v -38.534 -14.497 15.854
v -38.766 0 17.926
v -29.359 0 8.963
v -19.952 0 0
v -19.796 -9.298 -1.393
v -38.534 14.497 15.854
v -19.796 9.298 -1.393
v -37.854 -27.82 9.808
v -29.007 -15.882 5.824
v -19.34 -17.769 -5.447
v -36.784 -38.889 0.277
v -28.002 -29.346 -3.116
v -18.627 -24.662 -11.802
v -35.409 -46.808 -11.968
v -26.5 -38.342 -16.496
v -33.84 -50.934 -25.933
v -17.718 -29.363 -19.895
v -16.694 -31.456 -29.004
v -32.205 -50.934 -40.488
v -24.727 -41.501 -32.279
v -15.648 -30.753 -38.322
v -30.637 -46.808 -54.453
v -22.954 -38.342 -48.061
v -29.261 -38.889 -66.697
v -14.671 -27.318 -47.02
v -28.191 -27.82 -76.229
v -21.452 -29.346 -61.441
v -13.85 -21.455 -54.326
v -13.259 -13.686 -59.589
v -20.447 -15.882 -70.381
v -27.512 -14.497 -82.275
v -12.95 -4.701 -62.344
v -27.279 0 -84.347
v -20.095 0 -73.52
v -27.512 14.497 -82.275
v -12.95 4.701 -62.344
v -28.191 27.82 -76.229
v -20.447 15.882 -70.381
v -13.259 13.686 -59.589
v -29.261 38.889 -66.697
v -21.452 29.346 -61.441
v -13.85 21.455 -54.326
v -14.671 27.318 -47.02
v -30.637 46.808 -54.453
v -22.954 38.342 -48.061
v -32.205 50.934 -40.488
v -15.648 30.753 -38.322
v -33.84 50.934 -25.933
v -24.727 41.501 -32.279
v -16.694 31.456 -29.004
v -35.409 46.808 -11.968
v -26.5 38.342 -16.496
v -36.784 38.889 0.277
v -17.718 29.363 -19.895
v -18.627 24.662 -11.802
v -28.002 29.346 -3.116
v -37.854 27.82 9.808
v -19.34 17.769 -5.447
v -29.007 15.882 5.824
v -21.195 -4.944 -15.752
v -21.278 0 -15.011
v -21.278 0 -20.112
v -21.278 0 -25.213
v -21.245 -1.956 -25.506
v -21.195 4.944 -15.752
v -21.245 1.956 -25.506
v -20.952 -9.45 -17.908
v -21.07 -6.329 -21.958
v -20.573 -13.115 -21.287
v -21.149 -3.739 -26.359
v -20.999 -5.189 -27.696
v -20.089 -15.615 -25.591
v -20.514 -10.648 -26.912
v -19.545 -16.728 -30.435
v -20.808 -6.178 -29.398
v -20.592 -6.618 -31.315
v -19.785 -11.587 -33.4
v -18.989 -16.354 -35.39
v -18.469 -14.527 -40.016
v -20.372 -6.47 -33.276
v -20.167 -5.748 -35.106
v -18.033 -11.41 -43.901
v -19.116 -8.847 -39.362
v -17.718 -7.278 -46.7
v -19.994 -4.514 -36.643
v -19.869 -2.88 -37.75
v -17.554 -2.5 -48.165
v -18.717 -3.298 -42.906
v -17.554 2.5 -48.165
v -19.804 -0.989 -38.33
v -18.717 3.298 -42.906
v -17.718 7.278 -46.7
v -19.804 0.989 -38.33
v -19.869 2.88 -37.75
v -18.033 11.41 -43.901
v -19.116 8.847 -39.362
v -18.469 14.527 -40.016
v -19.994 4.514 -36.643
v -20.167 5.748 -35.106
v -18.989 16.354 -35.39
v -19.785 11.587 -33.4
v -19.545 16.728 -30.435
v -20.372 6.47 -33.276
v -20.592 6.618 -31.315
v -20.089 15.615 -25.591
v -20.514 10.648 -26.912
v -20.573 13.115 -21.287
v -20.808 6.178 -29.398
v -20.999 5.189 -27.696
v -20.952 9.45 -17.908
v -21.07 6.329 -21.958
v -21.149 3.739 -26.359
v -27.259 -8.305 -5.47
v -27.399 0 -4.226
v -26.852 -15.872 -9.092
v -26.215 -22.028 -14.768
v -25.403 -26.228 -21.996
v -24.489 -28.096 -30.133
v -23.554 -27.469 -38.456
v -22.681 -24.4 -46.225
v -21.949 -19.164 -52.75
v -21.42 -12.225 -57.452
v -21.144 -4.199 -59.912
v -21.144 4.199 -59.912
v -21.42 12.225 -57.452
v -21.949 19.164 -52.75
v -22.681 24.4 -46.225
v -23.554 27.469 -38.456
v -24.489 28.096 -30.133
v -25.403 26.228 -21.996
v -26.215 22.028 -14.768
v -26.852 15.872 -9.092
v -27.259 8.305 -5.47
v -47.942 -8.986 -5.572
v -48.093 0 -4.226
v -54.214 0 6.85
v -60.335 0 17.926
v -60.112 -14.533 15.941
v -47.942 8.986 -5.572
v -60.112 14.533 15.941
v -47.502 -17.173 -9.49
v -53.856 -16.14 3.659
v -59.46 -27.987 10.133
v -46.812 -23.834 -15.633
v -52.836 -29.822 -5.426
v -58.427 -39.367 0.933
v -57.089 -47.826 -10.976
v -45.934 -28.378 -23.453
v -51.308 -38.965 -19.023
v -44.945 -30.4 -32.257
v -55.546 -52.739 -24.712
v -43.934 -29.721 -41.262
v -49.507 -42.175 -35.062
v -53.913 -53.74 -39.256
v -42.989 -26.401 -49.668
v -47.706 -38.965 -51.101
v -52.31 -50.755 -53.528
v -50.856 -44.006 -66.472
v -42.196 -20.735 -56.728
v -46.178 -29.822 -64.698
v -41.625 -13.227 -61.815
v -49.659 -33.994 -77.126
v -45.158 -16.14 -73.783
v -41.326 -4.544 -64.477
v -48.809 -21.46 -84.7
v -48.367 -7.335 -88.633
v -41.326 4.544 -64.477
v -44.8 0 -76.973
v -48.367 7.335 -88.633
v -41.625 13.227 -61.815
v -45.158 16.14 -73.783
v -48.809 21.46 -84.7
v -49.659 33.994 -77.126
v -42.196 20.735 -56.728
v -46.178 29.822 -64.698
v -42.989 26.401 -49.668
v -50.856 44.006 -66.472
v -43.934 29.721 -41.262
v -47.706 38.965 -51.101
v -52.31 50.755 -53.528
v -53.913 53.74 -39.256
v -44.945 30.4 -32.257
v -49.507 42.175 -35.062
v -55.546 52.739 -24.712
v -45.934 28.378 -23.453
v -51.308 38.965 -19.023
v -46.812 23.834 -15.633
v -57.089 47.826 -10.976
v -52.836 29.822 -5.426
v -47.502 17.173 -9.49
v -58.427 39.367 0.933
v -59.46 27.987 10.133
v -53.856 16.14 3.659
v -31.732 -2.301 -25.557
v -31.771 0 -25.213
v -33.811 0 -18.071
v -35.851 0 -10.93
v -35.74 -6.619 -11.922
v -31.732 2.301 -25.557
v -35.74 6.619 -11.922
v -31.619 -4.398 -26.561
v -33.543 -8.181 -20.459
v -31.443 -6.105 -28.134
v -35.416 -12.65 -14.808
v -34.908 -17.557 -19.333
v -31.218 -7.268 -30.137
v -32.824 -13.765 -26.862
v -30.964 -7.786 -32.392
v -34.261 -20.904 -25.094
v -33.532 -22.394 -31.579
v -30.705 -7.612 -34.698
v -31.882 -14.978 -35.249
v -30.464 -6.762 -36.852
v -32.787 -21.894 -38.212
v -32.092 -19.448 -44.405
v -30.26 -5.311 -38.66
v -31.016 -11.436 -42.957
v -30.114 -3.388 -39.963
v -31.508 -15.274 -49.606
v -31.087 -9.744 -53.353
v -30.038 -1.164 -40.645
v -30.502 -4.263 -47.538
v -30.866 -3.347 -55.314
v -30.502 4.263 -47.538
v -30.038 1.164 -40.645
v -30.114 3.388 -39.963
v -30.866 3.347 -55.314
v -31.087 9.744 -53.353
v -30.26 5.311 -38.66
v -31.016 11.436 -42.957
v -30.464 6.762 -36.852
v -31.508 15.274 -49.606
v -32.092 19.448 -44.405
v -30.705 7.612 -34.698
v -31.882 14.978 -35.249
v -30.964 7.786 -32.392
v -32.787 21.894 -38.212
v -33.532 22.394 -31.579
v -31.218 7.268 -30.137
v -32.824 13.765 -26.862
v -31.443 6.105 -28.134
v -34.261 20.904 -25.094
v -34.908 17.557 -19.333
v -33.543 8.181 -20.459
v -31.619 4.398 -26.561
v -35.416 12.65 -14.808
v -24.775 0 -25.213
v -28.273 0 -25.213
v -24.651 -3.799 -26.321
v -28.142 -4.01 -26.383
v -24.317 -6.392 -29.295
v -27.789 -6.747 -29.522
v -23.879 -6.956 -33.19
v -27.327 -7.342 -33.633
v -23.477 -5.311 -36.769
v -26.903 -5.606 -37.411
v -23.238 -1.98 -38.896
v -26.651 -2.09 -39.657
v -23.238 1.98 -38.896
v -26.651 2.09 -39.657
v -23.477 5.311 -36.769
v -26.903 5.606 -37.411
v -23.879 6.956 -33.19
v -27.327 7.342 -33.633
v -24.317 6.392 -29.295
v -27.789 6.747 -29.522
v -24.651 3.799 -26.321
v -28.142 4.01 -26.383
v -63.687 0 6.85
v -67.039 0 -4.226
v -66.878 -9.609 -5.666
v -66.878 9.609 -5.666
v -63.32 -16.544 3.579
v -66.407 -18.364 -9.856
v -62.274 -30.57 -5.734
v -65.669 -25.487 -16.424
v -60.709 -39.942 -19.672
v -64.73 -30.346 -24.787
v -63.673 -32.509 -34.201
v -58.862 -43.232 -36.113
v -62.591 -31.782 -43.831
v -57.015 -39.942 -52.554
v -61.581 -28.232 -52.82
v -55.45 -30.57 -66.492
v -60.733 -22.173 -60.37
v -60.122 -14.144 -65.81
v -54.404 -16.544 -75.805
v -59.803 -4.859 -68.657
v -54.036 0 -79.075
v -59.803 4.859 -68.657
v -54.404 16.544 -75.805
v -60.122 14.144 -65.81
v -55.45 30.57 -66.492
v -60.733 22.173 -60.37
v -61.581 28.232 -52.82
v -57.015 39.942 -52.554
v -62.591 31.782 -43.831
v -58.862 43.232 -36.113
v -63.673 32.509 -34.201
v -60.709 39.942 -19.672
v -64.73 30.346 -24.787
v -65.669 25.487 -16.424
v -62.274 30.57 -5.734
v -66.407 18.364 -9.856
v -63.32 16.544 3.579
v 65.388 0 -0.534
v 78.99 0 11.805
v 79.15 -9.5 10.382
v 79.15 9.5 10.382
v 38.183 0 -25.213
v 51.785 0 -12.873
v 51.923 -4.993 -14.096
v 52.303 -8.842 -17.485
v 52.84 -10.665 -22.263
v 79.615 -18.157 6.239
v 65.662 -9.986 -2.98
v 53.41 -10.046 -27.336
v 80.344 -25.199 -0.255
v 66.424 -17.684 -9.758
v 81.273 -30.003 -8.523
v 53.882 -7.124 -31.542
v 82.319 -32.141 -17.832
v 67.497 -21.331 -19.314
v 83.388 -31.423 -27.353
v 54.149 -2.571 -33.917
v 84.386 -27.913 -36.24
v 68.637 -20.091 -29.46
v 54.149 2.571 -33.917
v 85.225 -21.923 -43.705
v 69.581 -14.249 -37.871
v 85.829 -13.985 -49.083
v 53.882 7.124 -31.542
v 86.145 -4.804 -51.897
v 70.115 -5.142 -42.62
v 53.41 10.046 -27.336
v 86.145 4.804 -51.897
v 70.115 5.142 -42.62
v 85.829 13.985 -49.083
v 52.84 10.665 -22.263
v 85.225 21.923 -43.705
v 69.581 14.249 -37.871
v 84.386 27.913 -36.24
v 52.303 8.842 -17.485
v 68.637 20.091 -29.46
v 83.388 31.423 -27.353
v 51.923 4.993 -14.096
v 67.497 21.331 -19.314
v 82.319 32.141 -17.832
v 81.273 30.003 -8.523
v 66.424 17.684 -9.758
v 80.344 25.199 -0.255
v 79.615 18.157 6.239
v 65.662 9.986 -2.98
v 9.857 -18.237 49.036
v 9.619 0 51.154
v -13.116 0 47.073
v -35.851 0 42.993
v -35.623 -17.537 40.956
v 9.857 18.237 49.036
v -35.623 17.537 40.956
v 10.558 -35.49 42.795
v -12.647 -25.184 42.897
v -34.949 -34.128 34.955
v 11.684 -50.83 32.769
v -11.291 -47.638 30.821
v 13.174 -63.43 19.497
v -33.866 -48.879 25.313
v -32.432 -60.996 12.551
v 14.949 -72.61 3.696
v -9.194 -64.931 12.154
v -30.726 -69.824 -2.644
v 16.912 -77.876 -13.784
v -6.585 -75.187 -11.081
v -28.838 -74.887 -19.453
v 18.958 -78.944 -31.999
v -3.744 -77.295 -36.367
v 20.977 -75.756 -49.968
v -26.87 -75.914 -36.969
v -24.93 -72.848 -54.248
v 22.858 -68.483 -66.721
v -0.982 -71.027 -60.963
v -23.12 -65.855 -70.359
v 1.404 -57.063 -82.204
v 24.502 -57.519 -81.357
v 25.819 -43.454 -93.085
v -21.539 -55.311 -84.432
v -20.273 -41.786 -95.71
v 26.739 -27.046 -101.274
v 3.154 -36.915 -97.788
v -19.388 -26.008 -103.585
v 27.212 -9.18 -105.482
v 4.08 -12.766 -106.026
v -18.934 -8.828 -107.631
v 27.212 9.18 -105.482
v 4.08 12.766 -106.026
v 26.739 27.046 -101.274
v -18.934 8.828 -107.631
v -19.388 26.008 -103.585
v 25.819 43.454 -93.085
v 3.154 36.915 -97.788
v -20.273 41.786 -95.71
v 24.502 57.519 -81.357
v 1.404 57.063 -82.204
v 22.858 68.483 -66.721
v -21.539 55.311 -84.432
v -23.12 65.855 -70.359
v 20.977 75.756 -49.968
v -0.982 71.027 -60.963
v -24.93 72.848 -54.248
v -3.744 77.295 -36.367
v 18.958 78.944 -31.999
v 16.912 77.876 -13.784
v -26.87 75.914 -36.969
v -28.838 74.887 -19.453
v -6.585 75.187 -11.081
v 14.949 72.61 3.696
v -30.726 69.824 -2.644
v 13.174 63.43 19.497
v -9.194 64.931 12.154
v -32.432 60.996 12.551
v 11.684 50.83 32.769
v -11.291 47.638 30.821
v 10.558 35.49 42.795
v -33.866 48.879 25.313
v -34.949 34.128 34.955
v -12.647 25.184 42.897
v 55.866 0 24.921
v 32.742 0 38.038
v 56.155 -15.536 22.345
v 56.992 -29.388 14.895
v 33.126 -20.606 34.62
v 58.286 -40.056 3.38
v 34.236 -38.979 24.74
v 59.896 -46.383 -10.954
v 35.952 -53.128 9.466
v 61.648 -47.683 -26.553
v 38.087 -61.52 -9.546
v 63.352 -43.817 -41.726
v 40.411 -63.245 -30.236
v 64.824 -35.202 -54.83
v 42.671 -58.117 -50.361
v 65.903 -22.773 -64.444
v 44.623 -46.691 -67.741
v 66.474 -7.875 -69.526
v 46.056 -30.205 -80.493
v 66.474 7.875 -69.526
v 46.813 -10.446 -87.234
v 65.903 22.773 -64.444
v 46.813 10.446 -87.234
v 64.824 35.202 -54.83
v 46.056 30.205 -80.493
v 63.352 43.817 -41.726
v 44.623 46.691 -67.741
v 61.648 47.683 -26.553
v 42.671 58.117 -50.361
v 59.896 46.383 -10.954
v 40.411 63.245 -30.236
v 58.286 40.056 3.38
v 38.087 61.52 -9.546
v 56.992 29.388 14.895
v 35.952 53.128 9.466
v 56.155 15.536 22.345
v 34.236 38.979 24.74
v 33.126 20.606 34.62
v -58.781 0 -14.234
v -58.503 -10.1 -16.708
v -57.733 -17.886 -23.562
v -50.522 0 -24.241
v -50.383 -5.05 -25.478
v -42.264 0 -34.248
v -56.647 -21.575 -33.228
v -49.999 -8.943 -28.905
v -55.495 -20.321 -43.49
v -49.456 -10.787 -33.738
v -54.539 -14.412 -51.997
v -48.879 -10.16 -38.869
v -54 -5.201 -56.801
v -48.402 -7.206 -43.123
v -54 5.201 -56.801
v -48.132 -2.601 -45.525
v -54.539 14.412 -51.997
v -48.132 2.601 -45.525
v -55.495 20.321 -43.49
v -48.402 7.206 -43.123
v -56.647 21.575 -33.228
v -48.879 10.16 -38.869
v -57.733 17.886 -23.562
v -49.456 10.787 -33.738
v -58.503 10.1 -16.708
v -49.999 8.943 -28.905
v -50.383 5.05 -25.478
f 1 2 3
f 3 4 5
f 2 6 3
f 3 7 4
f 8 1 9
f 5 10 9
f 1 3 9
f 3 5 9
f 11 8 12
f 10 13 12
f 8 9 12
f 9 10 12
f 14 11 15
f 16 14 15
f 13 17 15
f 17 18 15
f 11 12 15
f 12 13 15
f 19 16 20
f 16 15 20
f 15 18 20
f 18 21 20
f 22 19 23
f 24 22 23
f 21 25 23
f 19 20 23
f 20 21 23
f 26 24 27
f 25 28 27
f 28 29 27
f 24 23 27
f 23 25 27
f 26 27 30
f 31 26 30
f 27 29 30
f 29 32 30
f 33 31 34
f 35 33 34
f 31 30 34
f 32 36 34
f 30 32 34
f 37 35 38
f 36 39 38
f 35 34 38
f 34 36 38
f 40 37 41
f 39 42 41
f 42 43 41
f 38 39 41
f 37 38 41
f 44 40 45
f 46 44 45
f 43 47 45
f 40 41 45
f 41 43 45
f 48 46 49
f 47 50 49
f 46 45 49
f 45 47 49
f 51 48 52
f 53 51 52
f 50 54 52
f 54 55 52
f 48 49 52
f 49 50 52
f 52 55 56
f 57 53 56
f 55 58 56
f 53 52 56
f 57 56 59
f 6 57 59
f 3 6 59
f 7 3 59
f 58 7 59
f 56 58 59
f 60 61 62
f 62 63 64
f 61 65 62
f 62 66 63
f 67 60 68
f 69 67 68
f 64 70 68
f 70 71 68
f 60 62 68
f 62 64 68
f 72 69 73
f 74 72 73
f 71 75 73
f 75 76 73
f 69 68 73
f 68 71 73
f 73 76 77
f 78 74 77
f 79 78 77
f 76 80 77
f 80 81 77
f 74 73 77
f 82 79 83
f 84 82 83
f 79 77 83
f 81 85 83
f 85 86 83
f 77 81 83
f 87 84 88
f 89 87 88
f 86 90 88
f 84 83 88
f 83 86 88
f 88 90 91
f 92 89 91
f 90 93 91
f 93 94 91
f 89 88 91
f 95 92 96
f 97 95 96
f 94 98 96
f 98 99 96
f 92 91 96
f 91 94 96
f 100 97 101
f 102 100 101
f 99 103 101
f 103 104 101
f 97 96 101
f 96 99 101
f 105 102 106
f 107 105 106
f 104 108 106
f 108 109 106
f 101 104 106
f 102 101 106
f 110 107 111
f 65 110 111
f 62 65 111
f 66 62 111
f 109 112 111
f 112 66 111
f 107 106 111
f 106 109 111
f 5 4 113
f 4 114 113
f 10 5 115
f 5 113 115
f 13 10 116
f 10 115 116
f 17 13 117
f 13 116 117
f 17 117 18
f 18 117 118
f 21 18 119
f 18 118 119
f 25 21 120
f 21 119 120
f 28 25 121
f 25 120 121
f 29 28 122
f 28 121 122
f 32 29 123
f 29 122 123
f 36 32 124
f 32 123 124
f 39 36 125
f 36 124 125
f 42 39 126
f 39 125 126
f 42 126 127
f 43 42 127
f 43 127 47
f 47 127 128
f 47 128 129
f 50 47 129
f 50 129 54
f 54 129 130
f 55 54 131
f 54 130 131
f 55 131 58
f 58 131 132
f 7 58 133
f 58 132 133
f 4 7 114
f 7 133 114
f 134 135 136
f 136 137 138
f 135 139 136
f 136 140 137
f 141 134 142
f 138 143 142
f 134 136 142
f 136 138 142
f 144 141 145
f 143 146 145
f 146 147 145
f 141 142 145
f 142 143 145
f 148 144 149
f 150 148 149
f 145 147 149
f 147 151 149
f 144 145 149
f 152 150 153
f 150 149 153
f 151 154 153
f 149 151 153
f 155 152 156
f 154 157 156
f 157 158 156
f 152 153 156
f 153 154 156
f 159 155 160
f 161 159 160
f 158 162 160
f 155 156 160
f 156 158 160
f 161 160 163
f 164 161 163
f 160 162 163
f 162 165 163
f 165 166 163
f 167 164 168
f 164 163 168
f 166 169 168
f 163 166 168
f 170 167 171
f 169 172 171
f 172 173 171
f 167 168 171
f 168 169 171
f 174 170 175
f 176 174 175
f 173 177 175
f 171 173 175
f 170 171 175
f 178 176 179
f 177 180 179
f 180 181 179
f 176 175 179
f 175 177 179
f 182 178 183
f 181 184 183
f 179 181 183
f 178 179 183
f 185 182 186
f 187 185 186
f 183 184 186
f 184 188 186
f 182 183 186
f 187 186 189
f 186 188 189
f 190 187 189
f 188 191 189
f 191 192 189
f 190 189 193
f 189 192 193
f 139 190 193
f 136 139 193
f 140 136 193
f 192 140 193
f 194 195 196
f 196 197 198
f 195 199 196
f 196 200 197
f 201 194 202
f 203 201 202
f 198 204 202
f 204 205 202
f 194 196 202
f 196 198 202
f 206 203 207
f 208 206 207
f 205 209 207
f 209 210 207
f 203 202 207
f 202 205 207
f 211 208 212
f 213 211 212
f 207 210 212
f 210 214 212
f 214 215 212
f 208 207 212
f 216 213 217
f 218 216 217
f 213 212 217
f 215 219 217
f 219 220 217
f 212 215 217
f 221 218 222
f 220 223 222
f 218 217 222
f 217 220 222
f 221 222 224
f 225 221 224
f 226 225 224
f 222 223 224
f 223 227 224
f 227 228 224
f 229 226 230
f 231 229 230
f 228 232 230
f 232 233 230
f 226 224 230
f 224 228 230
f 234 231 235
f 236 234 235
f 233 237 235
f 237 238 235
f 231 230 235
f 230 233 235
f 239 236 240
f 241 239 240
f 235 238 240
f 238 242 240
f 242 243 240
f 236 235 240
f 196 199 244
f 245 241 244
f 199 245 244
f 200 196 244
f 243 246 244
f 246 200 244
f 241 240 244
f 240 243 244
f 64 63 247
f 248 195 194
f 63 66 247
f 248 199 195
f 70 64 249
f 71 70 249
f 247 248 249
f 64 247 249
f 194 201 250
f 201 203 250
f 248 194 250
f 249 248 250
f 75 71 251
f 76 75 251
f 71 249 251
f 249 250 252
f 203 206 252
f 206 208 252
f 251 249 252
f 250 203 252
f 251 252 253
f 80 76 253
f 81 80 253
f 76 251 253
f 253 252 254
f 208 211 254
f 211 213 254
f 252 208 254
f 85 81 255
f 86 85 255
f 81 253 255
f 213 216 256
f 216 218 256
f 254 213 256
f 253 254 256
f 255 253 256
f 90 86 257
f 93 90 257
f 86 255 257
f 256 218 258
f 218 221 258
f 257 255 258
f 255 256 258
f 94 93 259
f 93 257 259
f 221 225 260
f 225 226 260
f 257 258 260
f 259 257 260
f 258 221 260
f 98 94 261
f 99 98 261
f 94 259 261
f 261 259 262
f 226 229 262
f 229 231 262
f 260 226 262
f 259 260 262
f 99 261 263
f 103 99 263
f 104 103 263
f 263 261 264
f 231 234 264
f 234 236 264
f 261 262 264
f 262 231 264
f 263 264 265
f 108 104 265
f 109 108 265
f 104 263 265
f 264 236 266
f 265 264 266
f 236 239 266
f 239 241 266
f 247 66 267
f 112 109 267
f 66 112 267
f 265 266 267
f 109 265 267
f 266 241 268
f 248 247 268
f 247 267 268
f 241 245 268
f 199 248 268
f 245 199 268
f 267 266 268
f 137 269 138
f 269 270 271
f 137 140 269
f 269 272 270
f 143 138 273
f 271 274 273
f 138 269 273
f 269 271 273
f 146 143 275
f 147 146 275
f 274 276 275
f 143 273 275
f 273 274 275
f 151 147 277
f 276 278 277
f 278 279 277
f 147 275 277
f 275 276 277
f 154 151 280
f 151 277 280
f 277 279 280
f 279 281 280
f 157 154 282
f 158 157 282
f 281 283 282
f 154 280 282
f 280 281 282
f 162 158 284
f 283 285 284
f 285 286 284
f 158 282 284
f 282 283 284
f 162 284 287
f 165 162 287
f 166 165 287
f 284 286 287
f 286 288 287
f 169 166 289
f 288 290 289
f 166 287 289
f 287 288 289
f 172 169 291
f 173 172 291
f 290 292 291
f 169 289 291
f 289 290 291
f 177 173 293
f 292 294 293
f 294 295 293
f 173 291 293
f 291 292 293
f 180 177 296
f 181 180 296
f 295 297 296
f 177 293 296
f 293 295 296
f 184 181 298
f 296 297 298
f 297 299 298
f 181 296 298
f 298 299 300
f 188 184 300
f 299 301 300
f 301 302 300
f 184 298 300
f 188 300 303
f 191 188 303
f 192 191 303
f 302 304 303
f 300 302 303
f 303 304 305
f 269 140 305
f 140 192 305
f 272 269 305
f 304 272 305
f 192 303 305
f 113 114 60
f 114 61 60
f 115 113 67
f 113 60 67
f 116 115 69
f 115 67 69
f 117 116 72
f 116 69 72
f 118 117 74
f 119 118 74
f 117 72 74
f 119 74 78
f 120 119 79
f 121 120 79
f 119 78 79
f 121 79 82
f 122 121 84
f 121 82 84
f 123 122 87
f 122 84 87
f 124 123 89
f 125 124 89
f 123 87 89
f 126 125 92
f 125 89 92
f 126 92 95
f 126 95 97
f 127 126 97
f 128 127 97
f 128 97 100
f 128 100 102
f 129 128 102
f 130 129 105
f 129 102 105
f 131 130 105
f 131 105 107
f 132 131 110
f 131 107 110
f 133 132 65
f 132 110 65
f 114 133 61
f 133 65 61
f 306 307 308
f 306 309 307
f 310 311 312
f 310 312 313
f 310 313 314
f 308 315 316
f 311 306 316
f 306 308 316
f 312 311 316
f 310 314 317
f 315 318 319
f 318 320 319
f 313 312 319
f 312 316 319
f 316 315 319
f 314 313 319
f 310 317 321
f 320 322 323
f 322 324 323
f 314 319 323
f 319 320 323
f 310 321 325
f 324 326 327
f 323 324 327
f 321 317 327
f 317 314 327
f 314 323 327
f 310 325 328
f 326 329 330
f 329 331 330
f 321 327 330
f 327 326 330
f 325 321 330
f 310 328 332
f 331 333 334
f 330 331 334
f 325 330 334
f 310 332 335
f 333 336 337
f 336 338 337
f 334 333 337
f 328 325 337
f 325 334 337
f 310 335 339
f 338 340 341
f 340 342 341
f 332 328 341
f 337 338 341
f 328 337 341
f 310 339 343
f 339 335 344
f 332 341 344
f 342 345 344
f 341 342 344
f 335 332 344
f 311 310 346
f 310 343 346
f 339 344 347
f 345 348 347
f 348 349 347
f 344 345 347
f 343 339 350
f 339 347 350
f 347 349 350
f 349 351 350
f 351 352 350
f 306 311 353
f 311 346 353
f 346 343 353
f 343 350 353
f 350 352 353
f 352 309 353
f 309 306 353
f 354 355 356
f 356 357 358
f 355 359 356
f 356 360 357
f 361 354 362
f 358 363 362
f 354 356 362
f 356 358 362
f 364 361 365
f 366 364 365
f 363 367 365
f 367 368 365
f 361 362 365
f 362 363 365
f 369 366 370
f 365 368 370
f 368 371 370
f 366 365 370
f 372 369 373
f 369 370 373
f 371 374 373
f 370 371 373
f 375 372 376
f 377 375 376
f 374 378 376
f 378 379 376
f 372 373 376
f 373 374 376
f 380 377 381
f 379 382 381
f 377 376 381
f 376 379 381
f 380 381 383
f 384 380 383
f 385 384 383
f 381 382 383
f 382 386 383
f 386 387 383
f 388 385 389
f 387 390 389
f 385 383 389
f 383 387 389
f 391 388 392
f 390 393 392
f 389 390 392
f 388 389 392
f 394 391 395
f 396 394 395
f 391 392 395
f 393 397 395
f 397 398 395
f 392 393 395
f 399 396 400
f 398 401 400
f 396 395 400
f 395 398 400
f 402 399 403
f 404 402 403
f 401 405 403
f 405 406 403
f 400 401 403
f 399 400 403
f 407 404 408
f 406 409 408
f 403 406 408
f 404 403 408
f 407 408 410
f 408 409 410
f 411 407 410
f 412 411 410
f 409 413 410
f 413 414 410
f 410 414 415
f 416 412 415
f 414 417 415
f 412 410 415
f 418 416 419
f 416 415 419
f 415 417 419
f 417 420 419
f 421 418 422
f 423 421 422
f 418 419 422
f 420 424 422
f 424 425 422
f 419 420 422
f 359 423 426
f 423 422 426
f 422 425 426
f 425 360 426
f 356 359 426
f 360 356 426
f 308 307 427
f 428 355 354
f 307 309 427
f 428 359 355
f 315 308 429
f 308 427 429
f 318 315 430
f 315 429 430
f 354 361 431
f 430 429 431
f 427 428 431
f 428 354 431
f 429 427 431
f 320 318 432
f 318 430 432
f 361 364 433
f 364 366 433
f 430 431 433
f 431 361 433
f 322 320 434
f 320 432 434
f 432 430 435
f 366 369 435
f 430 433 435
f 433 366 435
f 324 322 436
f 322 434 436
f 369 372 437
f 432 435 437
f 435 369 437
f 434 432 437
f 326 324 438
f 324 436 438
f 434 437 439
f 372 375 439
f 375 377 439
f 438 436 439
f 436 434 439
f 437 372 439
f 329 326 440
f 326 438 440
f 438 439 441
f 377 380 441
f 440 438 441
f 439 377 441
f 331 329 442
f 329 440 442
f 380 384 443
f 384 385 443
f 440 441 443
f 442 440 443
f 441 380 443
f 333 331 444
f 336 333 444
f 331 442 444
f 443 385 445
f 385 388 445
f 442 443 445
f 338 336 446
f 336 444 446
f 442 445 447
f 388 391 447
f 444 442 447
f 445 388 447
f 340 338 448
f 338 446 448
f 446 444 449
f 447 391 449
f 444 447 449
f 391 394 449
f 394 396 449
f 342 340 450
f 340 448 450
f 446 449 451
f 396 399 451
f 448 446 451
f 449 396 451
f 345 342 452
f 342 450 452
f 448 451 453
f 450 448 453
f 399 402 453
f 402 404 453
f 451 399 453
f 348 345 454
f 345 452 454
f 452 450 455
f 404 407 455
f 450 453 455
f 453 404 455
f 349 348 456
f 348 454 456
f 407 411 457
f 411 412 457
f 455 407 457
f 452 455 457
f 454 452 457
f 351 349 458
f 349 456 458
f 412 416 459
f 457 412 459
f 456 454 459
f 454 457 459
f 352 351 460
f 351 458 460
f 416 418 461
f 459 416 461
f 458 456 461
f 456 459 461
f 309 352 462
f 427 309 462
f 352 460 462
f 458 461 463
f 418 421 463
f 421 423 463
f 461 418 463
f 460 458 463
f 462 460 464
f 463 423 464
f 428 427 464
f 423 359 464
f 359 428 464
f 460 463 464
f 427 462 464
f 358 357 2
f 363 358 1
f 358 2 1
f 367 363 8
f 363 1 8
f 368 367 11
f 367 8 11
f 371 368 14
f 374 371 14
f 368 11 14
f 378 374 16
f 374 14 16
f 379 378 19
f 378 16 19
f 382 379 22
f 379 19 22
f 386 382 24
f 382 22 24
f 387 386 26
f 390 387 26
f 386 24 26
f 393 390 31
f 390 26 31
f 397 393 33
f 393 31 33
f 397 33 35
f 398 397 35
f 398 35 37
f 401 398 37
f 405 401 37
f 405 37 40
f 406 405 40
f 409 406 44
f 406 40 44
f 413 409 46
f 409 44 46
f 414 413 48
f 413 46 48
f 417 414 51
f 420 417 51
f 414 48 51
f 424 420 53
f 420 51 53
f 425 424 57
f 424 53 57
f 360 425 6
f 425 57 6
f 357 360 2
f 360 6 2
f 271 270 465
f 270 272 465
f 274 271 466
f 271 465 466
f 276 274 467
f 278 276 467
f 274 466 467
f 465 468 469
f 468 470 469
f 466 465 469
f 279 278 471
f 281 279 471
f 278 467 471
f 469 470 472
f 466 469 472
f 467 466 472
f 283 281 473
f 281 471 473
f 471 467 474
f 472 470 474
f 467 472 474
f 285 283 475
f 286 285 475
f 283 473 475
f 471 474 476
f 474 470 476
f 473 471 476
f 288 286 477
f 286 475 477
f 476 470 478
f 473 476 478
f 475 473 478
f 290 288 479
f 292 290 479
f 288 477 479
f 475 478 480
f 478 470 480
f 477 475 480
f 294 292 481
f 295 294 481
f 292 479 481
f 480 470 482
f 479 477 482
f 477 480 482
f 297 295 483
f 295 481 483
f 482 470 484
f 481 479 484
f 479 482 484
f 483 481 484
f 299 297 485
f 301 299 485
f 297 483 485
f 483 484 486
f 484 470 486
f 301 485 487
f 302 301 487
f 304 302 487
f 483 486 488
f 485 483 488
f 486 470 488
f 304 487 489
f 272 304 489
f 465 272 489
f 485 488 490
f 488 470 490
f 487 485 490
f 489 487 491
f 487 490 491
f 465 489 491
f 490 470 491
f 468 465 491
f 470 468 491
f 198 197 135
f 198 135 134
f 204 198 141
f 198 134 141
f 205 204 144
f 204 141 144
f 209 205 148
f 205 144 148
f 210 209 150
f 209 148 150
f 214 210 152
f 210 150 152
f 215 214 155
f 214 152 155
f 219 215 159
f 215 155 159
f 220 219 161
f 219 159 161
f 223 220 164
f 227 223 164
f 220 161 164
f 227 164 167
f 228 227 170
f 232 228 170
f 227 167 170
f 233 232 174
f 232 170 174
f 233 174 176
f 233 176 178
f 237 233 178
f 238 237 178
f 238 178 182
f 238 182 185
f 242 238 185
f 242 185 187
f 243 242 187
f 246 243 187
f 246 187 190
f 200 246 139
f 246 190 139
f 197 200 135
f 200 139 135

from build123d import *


with BuildPart() as f1:
    # F0 (on Front) → F1 (revolve)
    with BuildSketch(Plane.XZ):
        Polygon((-67.0393481851, -4.226393532), (-42.2639362514, -34.2483595014), (38.1832793355, -25.212623179), (-13.1163932383, 31.6250808537), (-35.8514748514, 42.9926253855), (-38.7662313879, 17.9257374257), (-19.9521857218, 0), (-27.3986887187, -4.226393532), (-21.2777052075, -15.0109836832), (-21.2777052075, -25.212623179), (-31.7708216608, -25.212623179), (-35.8514748514, -10.9303286299), (-48.0934418738, -4.226393532), (-60.3354126215, 17.9257374257), align=None)
        Polygon((-13.1163932383, 31.6250808537), (38.1832793355, -25.212623179), (78.9898335934, 11.8047548458), (9.6186883748, 51.153935492), (-35.8514748514, 42.9926253855), align=None)
    revolve(axis=Axis((-2.040328458, 0, -29.7304913402), (0.9937513025, 0, 0.1116169736)))


solid = f1.part
